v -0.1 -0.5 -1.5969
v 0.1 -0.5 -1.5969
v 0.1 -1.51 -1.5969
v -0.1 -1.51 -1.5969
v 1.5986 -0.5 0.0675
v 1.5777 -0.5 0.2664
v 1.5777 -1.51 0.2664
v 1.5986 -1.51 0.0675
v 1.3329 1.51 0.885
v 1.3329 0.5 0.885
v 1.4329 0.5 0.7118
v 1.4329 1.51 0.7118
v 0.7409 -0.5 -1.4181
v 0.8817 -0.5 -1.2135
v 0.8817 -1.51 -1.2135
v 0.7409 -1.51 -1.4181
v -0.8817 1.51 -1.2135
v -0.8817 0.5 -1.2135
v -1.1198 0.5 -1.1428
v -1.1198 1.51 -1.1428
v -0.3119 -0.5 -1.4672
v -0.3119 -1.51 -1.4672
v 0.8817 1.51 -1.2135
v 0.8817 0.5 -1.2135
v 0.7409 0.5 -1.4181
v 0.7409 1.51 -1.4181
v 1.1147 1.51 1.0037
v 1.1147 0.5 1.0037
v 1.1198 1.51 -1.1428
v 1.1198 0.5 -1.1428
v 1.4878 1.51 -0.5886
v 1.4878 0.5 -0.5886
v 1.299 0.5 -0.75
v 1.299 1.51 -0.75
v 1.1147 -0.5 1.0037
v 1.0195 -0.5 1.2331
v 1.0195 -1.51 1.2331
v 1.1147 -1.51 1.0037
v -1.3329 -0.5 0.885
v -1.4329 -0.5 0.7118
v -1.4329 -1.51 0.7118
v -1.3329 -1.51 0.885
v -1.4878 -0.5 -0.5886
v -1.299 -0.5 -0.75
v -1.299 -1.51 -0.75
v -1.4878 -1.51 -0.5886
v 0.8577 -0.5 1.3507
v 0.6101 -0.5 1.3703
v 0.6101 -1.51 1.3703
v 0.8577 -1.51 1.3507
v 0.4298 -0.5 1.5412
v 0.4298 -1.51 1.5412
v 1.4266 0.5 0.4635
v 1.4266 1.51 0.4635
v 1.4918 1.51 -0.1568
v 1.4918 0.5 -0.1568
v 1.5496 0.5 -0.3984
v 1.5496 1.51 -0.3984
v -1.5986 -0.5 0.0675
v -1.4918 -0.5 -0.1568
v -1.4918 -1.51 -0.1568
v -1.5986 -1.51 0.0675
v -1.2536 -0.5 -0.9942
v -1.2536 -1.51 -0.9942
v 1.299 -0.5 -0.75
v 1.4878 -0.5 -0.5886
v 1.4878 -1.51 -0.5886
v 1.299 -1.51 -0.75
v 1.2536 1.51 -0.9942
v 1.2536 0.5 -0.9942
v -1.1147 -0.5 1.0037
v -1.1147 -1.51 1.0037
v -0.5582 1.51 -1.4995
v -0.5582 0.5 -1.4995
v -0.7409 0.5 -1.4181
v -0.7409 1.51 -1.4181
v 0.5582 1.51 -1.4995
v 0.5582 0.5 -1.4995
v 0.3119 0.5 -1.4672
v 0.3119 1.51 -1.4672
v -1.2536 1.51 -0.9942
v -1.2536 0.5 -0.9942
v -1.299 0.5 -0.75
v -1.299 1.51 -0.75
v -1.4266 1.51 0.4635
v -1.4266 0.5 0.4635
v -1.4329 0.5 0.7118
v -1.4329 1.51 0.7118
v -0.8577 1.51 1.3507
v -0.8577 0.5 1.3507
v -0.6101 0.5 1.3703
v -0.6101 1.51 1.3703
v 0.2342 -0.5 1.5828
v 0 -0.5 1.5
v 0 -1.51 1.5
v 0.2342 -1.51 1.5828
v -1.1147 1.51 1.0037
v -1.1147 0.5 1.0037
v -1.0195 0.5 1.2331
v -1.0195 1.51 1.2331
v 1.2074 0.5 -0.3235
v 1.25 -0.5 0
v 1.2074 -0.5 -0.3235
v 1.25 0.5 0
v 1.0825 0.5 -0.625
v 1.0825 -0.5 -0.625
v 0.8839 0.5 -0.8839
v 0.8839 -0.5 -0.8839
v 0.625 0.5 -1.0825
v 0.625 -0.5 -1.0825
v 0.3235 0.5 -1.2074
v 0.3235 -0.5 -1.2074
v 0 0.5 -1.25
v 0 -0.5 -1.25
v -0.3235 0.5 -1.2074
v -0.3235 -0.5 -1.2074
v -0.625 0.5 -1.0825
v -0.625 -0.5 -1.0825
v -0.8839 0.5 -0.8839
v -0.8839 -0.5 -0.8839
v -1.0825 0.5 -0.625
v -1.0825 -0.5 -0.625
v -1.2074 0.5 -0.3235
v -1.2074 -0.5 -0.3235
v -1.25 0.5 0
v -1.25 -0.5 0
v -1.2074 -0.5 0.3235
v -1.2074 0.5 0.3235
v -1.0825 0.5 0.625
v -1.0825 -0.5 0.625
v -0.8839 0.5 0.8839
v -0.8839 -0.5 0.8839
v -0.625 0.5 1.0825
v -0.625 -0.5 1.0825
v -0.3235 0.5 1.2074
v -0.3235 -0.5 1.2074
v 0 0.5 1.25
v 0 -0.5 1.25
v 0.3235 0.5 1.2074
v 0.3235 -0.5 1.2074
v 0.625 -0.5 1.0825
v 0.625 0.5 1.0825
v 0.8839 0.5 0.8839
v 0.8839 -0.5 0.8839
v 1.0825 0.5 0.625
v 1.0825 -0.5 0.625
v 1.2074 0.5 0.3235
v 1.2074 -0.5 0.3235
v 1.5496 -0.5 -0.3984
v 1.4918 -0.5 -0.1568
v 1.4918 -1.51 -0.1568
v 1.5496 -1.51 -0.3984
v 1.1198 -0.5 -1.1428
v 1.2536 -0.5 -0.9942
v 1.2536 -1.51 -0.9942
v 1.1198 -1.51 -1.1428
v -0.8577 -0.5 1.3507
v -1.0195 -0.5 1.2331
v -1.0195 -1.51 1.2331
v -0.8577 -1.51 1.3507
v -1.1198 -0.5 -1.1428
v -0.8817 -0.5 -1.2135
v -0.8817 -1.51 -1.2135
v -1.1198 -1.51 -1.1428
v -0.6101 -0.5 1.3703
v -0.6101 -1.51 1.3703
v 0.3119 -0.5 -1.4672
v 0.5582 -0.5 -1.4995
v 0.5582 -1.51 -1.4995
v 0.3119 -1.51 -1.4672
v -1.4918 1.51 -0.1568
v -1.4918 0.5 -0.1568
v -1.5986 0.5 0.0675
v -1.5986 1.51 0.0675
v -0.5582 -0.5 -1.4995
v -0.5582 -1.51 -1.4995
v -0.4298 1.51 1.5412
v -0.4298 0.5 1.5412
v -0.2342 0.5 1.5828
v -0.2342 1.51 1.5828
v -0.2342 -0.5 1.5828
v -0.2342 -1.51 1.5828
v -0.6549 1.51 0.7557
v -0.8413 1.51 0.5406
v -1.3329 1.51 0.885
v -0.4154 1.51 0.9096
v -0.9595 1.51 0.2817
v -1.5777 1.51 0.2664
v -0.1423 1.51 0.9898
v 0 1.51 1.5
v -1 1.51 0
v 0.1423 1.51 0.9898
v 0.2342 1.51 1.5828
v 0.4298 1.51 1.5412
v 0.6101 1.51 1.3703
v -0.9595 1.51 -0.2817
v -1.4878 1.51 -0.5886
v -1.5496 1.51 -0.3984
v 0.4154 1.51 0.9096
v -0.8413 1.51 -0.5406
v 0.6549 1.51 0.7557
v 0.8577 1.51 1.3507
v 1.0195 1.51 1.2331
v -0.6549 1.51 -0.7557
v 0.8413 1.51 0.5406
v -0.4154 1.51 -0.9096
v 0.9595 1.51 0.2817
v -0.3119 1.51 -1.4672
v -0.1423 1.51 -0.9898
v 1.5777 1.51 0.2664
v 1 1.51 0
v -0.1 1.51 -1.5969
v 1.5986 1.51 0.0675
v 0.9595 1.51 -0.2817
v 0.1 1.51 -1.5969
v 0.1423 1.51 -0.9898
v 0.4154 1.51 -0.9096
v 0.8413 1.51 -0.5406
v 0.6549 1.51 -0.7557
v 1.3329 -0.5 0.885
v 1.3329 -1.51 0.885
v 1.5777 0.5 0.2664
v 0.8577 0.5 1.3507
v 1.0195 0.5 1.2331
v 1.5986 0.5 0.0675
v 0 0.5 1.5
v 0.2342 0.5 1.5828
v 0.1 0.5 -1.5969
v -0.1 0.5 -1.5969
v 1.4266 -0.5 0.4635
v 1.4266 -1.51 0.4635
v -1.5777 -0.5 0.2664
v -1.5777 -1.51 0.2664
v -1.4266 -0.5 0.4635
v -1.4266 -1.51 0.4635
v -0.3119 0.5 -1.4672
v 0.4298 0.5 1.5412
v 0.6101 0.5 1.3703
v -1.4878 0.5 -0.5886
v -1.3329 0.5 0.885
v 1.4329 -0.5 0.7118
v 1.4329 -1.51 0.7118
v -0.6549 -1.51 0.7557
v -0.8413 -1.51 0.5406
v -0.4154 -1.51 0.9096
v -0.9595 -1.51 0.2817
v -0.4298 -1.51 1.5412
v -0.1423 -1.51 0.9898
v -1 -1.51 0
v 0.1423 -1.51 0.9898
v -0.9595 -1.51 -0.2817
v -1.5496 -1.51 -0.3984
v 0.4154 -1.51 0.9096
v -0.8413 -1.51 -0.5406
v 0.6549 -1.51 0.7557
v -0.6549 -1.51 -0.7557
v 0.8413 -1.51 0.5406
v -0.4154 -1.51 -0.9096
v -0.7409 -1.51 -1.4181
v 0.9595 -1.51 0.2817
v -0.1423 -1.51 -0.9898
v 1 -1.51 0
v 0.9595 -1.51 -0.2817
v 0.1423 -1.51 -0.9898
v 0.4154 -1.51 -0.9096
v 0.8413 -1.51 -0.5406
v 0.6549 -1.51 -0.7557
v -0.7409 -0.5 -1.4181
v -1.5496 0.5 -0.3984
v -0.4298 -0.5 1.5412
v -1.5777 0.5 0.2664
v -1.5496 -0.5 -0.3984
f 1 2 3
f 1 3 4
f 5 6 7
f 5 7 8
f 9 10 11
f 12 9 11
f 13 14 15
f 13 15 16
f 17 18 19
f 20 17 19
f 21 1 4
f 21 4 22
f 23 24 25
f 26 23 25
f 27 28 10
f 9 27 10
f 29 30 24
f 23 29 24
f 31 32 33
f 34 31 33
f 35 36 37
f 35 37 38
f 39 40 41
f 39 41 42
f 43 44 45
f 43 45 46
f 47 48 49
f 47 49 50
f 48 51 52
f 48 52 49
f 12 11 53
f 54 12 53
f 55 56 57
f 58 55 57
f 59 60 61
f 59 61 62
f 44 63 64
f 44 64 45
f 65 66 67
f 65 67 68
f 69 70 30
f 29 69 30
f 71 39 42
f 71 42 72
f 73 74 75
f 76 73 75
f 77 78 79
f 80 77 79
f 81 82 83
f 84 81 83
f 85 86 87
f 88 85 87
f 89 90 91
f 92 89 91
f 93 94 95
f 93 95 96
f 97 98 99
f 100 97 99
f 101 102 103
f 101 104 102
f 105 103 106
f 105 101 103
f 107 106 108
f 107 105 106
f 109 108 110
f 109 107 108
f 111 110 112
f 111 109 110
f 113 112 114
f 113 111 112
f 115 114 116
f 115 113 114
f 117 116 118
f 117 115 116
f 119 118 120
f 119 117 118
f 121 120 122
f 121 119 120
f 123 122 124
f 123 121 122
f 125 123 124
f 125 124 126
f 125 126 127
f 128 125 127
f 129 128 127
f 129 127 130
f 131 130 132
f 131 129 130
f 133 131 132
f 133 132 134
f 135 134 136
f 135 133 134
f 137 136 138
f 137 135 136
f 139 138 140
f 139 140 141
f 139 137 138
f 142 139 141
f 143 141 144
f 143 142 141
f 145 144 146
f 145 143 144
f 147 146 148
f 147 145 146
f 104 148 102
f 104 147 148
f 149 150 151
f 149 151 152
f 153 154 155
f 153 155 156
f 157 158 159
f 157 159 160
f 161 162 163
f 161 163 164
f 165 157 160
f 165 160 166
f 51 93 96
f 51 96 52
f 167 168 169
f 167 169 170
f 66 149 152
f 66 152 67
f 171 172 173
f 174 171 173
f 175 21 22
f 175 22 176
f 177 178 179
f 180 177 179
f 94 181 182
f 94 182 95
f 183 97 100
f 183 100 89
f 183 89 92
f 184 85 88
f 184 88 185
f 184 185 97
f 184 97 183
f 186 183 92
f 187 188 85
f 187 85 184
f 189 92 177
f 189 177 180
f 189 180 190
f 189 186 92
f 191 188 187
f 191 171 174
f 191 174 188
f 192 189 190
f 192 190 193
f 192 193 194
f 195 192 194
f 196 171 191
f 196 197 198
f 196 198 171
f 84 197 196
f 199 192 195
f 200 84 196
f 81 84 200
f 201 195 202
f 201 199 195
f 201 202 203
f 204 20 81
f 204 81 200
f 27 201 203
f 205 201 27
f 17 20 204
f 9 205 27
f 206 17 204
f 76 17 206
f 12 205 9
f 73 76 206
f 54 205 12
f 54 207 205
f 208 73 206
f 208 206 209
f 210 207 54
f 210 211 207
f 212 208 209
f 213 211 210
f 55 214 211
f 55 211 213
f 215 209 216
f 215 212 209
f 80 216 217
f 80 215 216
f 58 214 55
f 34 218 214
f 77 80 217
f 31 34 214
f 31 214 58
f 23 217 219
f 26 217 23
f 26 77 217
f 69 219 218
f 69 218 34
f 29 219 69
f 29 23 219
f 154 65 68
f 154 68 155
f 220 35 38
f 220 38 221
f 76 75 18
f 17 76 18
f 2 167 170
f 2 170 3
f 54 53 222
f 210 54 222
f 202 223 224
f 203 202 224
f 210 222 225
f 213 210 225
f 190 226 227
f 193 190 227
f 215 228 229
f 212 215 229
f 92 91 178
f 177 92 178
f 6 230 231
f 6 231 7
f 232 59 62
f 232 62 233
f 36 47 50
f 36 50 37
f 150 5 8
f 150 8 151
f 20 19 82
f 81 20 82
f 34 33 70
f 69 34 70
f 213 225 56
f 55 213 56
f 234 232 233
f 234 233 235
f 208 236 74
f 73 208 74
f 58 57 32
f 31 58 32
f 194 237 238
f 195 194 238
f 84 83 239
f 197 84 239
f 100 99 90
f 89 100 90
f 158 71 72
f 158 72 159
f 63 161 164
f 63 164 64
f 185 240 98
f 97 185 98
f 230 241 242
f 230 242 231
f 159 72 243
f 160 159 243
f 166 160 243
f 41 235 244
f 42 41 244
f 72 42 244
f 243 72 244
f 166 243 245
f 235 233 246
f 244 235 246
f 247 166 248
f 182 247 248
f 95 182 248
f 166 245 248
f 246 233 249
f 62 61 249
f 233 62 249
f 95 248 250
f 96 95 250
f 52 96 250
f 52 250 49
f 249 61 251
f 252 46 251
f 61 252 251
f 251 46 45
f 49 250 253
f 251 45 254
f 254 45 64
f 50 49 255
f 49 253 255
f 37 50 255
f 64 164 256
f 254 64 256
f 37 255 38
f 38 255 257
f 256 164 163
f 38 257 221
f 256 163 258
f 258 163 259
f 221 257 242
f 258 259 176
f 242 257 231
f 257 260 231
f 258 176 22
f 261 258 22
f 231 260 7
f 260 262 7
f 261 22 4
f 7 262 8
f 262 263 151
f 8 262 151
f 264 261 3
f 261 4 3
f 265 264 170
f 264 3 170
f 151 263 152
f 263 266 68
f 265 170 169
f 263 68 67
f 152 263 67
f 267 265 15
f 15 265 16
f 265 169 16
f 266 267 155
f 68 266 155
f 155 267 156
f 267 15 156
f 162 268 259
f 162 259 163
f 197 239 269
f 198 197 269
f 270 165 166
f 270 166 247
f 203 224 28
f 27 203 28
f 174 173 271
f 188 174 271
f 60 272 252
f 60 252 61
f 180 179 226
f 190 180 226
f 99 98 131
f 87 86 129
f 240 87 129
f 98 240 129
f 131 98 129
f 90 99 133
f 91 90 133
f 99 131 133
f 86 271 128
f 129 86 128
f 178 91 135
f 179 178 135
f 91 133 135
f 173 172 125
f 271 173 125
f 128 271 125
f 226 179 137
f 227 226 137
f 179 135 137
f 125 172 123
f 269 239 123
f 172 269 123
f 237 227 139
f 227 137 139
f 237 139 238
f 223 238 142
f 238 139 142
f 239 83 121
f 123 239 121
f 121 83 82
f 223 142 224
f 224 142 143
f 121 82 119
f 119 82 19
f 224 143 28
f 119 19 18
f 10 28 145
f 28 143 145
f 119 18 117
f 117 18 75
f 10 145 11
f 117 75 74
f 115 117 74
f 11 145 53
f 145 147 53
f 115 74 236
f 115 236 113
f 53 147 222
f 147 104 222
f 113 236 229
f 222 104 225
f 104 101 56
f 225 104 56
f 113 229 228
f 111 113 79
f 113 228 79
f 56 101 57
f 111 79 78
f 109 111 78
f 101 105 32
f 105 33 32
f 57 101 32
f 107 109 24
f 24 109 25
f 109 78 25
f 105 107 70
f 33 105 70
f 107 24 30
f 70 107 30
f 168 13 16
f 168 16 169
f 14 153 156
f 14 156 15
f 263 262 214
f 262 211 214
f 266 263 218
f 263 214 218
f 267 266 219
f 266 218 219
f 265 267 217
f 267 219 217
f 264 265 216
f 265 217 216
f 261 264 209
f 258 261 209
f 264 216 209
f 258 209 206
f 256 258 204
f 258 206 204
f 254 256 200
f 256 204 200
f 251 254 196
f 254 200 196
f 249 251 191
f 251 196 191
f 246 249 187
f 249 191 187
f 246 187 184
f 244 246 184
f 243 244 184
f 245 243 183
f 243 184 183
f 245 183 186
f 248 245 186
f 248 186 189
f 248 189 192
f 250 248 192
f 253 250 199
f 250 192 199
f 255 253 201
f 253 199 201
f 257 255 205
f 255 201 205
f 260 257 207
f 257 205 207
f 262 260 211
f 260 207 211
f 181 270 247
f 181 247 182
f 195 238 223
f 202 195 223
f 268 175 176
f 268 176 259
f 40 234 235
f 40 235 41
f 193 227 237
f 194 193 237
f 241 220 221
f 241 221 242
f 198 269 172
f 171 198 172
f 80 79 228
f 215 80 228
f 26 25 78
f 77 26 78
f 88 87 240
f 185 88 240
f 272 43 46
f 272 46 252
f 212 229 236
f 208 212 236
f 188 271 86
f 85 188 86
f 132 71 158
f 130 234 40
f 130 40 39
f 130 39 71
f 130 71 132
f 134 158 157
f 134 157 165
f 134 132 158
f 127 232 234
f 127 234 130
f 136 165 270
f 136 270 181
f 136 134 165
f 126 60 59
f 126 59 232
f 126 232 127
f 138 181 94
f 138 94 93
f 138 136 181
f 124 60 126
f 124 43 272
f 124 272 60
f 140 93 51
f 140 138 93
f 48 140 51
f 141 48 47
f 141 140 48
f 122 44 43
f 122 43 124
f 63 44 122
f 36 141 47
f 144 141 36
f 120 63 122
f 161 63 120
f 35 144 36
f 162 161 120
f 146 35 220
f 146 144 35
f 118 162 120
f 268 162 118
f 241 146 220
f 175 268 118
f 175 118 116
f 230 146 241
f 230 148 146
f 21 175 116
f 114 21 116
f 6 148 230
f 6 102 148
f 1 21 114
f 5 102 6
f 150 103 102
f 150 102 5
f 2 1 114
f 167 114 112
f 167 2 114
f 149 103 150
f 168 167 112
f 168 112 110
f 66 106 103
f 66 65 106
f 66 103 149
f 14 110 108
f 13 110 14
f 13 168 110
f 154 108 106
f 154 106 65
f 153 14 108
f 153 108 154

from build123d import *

# Parameters (mm, degrees)
SKETCH1_R           = 1.25
SKETCH1_R_2         = 1
BOSS_EXTRUDE1_DEPTH = 0.5
SKETCH2_R           = 1
BOSS_EXTRUDE2_DEPTH = 1.01


with BuildPart() as part:
    # Sketch1 → Boss-Extrude1 (new body)
    with BuildSketch(Plane(origin=(0, 0, 0), x_dir=(1, 0, 0), z_dir=(0, 1, 0))):
        Circle(SKETCH1_R)
        Circle(SKETCH1_R_2, mode=Mode.SUBTRACT)
    boss_extrude1 = extrude(amount=BOSS_EXTRUDE1_DEPTH)

    # Sketch2 → Boss-Extrude2 (add)
    with BuildSketch(Plane(origin=(0, 0.5, 0), x_dir=(1, 0, 0), z_dir=(0, 1, 0))):
        Polygon((-0.740860879, 1.418141445), (-0.881677878, 1.213525492), (-1.11979406, 1.142830374), (-1.253620181, 0.994201408), (-1.299038106, 0.75), (-1.487813767, 0.58856622), (-1.549617166, 0.398354916), (-1.491782843, 0.156792695), (-1.598576957, -0.067466381), (-1.577671264, -0.26637076), (-1.426584774, -0.463525492), (-1.432931669, -0.711833431), (-1.332931669, -0.885038512), (-1.114717238, -1.00369591), (-1.019519477, -1.233118014), (-0.857716078, -1.350675064), (-0.610104965, -1.370318186), (-0.429823106, -1.54118529), (-0.234193585, -1.582767628), (0, -1.5), (0.234193585, -1.582767628), (0.429823106, -1.54118529), (0.610104965, -1.370318186), (0.857716078, -1.350675064), (1.019519477, -1.233118014), (1.114717238, -1.00369591), (1.332931669, -0.885038512), (1.432931669, -0.711833431), (1.426584774, -0.463525492), (1.577671264, -0.26637076), (1.598576957, -0.067466381), (1.491782843, 0.156792695), (1.549617166, 0.398354916), (1.487813767, 0.58856622), (1.299038106, 0.75), (1.253620181, 0.994201408), (1.11979406, 1.142830374), (0.881677878, 1.213525492), (0.740860879, 1.418141445), (0.558151787, 1.499488774), (0.311867536, 1.467221401), (0.1, 1.596871942), (-0.1, 1.596871942), (-0.311867536, 1.467221401), (-0.558151787, 1.499488774), align=None)
        Circle(SKETCH2_R, mode=Mode.SUBTRACT)
    boss_extrude2 = extrude(amount=BOSS_EXTRUDE2_DEPTH)

    # Mirror1: Boss-Extrude1, Boss-Extrude2 across plane
    add(boss_extrude1.mirror(Plane.ZX))
    add(boss_extrude2.mirror(Plane.ZX))


solid = part.part
